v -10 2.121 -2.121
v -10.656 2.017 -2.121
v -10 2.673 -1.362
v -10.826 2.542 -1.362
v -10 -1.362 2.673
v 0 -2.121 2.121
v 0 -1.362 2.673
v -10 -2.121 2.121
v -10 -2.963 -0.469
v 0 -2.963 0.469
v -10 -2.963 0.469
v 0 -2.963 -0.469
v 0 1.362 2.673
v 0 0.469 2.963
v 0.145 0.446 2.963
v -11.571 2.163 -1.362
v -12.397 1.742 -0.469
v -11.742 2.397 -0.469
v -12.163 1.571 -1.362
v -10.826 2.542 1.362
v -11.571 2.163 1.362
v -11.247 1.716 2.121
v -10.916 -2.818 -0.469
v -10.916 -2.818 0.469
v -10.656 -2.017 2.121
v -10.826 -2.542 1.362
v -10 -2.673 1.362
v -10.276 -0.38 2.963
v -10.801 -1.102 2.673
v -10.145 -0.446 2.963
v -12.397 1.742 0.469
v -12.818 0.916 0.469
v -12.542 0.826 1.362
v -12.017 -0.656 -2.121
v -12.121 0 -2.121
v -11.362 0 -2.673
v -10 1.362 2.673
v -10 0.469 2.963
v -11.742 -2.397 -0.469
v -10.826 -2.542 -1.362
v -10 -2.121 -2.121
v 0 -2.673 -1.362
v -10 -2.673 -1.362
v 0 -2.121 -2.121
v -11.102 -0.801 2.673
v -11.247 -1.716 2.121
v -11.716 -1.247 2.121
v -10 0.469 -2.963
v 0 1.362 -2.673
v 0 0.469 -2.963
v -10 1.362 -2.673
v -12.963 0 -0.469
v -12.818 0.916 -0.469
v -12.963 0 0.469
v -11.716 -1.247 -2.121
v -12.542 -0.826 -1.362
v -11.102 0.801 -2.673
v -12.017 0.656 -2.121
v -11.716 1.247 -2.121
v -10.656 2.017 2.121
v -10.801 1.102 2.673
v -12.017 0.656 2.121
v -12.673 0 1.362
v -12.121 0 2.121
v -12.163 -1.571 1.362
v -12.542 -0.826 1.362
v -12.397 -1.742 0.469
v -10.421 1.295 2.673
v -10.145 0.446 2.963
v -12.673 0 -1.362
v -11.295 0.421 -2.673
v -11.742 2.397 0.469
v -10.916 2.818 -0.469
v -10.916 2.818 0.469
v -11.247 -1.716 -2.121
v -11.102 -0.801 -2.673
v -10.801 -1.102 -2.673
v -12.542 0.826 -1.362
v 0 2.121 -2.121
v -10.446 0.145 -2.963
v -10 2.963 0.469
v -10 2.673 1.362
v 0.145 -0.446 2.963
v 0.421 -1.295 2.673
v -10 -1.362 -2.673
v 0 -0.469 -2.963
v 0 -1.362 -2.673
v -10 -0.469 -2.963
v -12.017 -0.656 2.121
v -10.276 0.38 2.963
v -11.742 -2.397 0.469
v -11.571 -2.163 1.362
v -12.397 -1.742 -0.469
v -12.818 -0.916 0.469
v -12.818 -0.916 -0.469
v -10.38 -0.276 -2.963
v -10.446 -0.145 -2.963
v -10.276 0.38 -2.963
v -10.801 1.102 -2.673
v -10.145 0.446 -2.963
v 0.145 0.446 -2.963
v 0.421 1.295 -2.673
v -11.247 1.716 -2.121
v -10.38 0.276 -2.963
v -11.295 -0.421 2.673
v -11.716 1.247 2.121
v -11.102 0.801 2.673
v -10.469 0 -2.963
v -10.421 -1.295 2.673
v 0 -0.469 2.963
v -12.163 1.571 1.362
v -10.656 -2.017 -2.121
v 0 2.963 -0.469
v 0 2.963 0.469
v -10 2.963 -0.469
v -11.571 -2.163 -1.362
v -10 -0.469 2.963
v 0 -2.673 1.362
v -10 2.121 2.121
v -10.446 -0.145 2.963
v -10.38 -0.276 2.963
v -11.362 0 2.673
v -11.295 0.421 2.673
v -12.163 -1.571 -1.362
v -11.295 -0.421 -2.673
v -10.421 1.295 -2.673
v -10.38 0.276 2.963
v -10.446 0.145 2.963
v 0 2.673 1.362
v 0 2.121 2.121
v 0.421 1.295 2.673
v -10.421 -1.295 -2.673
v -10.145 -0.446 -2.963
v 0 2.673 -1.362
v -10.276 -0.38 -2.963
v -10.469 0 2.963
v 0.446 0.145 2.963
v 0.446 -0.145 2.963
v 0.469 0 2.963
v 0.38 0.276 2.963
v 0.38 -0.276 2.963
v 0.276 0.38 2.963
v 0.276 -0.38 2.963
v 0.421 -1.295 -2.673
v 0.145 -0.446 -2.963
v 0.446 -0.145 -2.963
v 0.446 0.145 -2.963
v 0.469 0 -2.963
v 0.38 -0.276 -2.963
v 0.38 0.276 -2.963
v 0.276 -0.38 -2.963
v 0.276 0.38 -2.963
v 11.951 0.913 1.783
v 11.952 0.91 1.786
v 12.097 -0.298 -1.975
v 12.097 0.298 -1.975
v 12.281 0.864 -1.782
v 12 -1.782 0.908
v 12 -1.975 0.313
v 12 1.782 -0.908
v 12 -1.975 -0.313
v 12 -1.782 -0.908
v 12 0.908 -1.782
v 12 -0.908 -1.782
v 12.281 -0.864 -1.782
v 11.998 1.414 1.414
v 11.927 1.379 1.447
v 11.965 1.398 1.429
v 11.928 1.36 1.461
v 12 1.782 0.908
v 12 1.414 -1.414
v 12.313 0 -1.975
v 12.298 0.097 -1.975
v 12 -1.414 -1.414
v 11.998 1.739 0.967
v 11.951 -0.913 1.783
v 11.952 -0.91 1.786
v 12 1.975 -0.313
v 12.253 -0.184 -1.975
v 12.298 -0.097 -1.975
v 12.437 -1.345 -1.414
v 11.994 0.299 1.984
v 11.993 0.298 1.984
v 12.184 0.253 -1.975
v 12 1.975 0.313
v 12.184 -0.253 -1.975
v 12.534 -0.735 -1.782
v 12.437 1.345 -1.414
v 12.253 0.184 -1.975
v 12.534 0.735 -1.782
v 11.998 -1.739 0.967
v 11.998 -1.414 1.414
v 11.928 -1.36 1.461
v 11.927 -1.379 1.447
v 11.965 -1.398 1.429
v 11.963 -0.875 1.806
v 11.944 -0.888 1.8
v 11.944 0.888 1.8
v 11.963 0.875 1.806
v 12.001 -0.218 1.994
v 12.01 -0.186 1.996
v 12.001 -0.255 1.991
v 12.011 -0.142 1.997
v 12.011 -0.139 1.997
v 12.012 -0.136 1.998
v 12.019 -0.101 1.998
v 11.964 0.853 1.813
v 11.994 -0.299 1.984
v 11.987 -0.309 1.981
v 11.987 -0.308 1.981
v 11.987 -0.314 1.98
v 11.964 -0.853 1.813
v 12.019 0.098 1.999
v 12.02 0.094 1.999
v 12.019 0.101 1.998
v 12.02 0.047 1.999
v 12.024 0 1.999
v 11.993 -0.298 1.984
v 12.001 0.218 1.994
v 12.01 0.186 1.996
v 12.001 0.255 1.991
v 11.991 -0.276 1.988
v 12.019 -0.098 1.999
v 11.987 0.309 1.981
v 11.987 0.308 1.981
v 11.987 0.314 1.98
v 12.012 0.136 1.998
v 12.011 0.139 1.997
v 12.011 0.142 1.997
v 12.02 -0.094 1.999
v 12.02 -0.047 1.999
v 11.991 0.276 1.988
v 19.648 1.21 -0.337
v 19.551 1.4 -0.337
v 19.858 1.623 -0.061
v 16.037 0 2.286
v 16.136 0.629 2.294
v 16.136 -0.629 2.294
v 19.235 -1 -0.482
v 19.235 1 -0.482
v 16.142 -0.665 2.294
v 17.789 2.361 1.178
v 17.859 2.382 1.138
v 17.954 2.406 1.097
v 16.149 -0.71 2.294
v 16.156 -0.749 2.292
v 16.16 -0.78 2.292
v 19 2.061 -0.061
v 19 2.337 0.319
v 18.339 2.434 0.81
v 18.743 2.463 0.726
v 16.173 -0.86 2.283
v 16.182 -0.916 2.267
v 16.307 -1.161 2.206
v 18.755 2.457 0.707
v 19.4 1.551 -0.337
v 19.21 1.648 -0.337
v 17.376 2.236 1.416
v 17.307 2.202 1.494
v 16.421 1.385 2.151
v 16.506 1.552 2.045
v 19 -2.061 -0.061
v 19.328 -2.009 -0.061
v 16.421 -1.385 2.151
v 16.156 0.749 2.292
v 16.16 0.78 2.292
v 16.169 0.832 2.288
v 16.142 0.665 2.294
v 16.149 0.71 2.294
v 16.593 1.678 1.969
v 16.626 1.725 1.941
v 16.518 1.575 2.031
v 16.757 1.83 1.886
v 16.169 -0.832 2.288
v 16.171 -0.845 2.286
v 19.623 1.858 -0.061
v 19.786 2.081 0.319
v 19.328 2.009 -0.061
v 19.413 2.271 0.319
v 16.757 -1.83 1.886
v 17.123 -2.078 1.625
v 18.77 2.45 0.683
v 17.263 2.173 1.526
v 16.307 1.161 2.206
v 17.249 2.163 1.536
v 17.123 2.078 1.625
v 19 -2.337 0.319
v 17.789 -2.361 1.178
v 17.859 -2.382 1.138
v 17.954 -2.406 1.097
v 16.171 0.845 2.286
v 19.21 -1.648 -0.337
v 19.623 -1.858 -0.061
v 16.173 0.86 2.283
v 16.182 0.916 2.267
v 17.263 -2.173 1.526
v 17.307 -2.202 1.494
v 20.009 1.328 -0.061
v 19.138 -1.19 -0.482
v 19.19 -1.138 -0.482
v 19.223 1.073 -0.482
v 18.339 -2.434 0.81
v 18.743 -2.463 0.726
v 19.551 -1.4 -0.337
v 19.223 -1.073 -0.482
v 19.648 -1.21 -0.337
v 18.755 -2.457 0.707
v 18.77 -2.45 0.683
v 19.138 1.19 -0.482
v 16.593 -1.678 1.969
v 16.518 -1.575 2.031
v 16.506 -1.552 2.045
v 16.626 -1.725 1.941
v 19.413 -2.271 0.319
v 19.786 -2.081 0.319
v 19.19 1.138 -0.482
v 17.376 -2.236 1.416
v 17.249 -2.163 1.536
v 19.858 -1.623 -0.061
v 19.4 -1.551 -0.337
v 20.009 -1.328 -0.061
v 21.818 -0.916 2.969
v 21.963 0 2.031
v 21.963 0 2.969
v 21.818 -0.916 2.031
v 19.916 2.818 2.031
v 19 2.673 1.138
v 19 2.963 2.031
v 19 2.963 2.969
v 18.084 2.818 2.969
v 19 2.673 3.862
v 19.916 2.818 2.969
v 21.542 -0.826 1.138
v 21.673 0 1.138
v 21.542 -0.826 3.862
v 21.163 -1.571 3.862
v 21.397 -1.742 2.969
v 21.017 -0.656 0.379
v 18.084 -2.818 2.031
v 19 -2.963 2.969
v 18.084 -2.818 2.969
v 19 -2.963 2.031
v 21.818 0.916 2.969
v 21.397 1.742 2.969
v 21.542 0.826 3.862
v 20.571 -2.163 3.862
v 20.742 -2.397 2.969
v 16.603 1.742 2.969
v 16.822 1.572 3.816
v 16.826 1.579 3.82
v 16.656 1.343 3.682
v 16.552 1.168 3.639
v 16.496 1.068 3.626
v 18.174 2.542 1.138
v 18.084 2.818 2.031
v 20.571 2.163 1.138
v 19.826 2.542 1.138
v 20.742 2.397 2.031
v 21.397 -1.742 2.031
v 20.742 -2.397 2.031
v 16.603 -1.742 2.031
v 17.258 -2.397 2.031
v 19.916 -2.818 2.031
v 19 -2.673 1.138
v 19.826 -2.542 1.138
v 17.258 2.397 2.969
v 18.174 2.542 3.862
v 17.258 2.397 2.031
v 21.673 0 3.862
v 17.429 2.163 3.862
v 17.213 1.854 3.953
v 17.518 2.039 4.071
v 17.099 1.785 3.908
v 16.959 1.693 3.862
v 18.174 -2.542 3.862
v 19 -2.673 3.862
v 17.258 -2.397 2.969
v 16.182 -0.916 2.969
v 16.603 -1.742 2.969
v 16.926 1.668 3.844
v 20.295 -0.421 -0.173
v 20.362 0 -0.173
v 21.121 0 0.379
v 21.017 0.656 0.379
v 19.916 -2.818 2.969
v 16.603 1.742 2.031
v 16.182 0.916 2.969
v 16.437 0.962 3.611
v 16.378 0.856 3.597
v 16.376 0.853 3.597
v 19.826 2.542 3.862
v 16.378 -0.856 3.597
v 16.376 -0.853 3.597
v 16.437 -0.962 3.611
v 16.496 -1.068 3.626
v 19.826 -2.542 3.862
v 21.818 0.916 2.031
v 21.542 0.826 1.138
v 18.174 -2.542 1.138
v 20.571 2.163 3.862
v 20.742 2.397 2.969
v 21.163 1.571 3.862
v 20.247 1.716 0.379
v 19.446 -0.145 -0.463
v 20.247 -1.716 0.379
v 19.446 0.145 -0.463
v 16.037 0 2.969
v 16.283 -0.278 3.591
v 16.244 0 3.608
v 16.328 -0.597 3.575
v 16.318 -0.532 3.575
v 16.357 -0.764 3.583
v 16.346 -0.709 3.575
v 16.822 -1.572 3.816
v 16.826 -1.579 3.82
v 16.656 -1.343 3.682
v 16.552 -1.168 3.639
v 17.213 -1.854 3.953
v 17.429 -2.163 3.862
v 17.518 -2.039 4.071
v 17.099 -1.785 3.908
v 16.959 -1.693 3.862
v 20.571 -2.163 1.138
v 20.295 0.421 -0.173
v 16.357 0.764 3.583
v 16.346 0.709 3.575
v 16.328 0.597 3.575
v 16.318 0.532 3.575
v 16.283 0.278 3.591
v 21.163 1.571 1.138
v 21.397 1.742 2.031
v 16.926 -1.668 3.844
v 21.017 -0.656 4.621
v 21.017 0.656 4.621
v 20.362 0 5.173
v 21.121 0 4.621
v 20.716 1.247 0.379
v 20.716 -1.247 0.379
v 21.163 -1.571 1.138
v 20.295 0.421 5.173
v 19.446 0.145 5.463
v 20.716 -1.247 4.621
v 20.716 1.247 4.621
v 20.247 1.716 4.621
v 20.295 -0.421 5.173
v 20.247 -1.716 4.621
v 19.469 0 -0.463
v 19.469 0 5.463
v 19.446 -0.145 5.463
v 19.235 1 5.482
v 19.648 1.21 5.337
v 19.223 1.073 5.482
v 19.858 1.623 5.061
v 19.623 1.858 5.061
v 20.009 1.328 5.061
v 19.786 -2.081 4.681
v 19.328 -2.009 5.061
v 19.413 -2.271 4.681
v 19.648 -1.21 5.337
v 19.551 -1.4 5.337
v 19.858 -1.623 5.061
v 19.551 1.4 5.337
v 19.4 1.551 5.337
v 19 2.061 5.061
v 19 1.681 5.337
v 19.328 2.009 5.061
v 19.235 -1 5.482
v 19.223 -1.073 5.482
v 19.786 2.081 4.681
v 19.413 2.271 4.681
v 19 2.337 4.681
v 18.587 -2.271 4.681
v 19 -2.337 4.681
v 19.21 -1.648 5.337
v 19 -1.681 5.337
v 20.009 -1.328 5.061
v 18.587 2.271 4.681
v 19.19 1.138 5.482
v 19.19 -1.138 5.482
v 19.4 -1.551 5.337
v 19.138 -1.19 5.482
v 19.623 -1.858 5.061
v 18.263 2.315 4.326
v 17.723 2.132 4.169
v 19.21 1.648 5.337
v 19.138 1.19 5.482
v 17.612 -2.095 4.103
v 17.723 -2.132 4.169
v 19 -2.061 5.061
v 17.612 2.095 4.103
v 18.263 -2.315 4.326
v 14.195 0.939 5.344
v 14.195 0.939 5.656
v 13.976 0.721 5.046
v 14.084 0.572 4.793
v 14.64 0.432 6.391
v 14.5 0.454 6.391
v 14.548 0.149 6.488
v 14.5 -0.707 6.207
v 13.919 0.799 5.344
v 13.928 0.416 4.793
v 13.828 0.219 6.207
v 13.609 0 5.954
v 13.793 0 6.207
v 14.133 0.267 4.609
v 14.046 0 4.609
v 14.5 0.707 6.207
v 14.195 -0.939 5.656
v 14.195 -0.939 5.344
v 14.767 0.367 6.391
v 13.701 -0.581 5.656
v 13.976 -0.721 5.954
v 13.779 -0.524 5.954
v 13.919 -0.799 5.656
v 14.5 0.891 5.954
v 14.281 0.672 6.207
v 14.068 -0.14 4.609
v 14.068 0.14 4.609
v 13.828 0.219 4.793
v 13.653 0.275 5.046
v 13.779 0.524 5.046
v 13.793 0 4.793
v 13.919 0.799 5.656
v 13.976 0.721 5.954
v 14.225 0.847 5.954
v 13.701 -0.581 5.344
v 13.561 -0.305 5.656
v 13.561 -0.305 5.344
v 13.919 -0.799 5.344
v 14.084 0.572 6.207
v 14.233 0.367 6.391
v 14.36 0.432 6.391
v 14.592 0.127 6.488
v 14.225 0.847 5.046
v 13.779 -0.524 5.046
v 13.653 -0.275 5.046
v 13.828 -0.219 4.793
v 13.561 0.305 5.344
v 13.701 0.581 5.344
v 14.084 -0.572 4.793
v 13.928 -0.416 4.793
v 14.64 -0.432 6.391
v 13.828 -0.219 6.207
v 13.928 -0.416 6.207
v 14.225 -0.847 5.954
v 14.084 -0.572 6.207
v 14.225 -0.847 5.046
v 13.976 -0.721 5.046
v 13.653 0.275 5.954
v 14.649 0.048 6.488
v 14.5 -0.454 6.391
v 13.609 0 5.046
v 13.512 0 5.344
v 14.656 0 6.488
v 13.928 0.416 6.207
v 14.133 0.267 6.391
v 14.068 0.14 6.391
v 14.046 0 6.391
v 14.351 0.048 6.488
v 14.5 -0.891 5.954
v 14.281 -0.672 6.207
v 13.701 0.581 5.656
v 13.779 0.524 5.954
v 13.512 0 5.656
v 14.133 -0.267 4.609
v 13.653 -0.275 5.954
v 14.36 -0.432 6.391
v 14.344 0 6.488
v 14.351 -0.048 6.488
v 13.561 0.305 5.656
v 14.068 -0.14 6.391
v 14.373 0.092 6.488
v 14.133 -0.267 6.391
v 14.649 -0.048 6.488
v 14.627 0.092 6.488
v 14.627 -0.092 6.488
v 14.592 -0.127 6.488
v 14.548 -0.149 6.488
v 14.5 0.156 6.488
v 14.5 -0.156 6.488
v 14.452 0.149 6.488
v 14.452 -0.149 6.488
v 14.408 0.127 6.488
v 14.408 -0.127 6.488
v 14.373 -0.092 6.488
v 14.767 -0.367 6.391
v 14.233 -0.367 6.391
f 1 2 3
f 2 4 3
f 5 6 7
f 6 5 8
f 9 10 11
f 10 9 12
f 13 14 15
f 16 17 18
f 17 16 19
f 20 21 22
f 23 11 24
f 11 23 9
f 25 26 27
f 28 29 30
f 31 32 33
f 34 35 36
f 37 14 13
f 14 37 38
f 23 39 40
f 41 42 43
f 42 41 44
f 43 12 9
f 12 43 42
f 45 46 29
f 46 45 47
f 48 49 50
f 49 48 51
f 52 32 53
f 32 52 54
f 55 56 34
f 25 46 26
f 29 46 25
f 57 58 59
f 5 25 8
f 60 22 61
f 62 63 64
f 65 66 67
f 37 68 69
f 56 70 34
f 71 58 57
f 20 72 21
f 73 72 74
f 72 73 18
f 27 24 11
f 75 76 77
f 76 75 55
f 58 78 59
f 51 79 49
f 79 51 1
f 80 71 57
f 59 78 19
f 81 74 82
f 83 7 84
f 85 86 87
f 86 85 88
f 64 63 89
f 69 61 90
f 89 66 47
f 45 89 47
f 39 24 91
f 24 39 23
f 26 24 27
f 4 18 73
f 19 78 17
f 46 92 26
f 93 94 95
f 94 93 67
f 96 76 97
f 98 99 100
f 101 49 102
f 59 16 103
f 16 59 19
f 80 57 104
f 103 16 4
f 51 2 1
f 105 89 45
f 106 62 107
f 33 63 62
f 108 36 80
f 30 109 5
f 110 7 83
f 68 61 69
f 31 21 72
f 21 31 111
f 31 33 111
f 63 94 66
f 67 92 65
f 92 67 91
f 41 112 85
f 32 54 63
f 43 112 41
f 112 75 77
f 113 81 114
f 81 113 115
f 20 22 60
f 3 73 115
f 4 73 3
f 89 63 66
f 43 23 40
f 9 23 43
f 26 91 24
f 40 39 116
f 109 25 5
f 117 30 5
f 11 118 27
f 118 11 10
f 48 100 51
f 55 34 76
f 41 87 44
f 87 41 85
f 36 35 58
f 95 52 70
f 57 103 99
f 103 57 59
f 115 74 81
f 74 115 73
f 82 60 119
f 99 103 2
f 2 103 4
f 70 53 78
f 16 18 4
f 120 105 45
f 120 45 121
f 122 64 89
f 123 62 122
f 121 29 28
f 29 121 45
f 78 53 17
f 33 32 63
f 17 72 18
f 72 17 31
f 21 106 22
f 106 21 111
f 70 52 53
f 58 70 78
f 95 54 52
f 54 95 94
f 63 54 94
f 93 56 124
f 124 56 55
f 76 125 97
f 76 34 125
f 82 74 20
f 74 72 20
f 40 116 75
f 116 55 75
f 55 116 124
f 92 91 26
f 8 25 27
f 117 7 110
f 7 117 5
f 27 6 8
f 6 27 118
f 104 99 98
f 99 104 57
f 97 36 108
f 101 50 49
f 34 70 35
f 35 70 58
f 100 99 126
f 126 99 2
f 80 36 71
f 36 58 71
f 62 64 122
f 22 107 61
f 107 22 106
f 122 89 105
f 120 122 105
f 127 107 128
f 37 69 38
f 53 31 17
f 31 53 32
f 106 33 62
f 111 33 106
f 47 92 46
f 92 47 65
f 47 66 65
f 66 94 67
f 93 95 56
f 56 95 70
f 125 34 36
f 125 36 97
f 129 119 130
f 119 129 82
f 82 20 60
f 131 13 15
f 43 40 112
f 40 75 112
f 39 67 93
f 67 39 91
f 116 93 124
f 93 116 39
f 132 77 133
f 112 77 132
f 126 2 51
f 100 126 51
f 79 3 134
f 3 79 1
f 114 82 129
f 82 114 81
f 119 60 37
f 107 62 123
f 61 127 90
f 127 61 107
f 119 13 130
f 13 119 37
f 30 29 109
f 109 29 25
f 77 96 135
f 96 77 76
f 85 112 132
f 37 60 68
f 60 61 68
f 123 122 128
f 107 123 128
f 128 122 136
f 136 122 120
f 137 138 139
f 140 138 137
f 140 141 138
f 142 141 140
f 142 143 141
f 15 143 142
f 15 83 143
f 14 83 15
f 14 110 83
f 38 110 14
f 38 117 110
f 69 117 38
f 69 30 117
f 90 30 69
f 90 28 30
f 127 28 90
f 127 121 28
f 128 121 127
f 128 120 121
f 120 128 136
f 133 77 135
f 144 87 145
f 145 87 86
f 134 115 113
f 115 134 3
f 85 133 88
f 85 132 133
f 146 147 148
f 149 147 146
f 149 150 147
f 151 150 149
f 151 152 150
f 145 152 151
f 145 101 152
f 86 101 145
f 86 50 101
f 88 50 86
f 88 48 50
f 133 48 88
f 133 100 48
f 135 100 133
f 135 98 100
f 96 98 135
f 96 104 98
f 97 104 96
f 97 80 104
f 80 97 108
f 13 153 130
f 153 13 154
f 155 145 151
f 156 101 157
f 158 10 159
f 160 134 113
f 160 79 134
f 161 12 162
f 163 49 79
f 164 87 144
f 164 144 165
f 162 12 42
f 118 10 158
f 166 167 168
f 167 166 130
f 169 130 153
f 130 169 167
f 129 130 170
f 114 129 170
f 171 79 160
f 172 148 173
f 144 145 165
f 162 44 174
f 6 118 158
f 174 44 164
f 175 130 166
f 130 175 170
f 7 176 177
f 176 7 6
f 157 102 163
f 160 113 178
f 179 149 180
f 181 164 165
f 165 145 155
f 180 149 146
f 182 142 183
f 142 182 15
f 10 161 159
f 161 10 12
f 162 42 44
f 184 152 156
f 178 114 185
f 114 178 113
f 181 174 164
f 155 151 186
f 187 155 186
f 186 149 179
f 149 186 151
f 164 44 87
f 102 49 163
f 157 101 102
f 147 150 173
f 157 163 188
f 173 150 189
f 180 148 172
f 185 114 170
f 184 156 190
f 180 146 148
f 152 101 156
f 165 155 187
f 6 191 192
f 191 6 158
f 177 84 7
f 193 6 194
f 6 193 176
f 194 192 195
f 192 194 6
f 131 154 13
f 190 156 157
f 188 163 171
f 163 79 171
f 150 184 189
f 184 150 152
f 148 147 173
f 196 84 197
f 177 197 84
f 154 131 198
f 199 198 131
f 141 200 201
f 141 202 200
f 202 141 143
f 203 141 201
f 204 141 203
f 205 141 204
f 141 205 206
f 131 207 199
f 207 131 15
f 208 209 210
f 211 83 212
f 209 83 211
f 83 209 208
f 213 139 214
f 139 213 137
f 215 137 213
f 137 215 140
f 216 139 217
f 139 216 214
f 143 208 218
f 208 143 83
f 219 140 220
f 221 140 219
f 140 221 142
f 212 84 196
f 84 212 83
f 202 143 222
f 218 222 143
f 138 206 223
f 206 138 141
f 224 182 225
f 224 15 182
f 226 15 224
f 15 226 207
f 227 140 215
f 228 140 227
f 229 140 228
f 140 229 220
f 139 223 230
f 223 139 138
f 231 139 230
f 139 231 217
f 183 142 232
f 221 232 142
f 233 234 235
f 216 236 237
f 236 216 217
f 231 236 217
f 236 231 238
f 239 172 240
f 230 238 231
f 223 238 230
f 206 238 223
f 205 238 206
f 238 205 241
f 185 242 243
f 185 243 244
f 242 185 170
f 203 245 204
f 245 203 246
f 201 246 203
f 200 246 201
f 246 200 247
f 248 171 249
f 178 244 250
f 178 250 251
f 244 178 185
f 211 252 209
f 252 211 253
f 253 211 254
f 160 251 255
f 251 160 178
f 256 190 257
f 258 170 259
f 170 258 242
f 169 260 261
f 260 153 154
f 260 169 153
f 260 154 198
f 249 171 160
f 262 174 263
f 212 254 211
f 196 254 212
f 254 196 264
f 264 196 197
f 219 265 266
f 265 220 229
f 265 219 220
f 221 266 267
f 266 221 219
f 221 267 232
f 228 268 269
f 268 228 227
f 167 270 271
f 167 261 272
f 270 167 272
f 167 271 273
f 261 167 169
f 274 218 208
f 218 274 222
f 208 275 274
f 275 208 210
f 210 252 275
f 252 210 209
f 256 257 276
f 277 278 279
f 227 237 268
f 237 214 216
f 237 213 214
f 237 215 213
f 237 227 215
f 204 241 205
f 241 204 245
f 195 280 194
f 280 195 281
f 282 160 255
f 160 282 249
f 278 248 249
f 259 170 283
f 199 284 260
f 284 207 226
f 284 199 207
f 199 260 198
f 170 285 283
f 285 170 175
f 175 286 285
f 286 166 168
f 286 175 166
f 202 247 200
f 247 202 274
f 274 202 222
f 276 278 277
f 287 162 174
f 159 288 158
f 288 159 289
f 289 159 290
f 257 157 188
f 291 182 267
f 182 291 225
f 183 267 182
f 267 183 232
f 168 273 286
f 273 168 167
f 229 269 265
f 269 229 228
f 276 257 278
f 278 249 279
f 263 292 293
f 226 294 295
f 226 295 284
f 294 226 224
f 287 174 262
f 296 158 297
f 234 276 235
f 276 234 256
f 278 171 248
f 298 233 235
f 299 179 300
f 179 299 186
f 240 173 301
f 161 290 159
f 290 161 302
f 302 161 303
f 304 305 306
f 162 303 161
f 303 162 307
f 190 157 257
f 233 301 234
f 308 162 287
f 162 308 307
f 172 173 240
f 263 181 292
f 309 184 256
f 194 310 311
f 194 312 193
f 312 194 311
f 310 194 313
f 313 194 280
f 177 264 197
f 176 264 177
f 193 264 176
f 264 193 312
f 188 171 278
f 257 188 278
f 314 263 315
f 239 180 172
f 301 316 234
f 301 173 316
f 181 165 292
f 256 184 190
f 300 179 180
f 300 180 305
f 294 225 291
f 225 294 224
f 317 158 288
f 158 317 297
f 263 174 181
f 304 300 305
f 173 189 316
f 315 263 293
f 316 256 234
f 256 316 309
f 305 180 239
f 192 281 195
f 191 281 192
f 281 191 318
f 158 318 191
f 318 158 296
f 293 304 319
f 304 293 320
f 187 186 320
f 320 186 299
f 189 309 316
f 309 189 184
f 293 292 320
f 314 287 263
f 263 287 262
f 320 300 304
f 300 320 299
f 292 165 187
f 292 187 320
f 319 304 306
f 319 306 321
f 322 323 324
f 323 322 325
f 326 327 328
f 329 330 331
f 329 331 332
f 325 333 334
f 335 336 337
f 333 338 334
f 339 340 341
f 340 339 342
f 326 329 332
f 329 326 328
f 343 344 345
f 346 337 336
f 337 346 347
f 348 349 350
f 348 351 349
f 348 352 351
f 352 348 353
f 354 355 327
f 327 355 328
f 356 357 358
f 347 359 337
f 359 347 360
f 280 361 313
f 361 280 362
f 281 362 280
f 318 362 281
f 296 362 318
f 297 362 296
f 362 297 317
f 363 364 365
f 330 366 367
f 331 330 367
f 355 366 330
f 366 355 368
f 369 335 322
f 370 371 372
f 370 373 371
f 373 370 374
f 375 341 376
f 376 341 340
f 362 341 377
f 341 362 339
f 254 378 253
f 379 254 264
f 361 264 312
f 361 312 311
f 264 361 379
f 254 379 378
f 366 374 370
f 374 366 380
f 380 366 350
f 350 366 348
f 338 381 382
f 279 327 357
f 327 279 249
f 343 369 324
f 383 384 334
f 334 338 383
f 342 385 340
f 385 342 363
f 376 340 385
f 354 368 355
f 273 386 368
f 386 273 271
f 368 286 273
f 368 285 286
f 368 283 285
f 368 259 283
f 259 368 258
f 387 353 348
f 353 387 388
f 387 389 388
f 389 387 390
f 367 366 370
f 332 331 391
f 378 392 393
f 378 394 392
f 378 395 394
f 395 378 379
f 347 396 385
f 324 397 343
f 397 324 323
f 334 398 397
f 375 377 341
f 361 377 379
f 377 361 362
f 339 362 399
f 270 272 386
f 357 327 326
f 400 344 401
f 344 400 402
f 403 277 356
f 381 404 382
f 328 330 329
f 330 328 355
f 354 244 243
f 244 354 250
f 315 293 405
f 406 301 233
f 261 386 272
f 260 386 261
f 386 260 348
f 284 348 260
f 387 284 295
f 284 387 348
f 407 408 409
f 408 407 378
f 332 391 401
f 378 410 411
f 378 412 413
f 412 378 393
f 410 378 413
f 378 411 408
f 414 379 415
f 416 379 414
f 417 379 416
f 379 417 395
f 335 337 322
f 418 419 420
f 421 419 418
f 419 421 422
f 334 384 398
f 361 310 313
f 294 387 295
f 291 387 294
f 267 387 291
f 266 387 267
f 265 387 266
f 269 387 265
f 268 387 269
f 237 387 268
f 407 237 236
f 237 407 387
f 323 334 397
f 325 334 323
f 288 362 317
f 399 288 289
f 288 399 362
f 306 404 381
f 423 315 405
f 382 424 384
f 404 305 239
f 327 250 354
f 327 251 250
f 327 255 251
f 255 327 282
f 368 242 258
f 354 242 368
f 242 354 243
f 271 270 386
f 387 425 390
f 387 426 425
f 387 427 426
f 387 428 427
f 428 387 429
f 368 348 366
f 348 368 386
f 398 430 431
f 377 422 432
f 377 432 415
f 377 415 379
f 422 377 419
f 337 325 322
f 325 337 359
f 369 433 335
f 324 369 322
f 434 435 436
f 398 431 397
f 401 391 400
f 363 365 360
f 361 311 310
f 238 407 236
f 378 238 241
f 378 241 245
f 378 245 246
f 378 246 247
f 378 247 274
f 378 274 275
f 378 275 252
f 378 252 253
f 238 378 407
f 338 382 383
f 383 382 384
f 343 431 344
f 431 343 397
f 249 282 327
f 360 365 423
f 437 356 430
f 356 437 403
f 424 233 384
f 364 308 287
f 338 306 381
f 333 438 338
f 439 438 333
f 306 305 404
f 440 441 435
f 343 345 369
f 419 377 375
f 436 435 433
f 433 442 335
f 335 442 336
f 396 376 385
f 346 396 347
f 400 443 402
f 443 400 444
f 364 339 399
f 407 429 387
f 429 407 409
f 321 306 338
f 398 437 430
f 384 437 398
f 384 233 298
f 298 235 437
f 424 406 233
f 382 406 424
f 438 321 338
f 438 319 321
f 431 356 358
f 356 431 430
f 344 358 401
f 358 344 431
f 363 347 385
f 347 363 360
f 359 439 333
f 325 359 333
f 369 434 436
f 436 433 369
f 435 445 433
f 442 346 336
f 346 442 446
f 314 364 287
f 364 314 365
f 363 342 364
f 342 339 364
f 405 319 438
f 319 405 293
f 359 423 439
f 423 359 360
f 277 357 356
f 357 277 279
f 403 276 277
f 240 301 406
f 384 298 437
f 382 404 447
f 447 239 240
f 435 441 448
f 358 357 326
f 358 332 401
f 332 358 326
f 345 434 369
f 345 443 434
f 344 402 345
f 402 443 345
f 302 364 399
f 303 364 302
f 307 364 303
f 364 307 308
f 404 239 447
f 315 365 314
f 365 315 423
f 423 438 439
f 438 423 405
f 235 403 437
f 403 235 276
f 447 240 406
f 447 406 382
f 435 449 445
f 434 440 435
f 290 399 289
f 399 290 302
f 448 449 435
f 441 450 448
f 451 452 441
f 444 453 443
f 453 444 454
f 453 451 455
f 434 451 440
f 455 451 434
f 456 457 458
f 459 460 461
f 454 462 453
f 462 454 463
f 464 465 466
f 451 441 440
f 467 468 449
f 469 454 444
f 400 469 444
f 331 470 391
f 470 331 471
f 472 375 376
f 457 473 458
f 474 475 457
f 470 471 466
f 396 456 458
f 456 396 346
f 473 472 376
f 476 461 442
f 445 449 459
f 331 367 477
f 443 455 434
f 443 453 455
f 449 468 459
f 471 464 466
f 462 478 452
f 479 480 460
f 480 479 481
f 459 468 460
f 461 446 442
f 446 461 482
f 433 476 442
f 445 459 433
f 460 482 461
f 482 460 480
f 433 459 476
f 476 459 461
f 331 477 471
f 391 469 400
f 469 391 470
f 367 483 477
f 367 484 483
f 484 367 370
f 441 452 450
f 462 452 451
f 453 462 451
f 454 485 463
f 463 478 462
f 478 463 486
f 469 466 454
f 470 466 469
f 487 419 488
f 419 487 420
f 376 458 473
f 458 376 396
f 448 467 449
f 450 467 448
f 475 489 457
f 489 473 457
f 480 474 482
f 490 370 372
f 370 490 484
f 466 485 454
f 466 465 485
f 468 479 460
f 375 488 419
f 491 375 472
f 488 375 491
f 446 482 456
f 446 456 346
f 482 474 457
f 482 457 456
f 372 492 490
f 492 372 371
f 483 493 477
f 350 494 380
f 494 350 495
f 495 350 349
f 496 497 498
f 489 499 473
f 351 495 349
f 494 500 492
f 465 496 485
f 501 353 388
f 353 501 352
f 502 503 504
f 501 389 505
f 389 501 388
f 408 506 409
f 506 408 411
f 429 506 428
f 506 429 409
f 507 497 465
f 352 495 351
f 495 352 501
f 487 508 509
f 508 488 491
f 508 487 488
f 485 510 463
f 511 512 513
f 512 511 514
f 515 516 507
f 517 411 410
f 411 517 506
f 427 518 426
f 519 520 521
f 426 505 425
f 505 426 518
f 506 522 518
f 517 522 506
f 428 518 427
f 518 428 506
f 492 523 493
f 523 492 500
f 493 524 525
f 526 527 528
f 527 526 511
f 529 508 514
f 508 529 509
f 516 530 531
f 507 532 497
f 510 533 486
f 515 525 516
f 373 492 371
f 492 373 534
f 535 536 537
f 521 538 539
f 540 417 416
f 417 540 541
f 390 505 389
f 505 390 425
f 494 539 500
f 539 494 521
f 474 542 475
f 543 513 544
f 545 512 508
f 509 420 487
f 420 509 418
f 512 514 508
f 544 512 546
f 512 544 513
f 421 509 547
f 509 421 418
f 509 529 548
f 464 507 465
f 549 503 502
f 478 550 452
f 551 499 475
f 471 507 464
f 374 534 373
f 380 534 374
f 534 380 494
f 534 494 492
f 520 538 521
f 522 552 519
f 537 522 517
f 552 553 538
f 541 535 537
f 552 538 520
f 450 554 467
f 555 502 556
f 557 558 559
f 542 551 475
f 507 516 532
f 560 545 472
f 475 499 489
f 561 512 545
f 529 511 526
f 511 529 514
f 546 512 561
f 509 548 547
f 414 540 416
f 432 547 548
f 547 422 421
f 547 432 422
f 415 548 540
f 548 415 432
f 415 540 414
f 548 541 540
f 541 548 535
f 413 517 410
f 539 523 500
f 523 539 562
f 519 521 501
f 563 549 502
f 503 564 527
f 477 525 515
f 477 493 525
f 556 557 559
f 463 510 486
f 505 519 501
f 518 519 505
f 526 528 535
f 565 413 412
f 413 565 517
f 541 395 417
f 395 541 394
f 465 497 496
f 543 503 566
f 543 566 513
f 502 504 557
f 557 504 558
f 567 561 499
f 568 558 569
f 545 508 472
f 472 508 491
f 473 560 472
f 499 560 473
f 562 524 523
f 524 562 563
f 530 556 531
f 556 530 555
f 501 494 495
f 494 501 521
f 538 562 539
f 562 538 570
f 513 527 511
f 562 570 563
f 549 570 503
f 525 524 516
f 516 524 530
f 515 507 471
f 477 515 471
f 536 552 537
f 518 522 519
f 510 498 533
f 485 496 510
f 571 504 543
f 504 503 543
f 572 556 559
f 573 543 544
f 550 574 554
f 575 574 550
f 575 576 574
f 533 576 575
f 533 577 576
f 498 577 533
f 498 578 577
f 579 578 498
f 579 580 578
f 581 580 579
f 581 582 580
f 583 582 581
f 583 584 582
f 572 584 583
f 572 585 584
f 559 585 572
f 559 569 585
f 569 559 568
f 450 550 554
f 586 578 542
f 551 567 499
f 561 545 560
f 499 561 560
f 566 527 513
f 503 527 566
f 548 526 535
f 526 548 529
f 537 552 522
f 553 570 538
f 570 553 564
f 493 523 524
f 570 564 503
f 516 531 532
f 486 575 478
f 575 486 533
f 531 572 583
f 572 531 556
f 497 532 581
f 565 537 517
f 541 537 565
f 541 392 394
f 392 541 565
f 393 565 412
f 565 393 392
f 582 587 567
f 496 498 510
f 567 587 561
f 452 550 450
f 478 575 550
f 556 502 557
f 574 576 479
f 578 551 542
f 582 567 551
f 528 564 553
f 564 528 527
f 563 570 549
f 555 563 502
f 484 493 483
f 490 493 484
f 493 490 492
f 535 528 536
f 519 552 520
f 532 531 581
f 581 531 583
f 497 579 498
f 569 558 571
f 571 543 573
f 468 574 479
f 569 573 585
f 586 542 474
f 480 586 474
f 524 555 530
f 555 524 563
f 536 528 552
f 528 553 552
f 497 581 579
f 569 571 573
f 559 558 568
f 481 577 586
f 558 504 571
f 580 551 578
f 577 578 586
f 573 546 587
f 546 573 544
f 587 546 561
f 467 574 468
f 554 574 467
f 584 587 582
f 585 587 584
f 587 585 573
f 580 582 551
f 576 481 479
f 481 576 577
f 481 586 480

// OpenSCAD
$fn = 20;

handle_l = 10;
handle_r = 3;

neck_r = 2;
neck_l = 12;

tip_r = 3;
tip_l = 7;
tip_h = 2.5;

hook_r = 1;
hook_l = 4.5;
hook_h = 3;

module base(){translate([-handle_l, 0, 0]) sphere(handle_r);}
module shoulder(){sphere(handle_r);}
module neck(){translate([neck_l, 0, 0]) sphere(neck_r);}
module jaw(w=1/3){
    translate([neck_l + tip_l, tip_r*w, tip_h - tip_r/2])
    sphere(tip_r/2);
    translate([neck_l + tip_l, -tip_r*w, tip_h - tip_r/2])
    sphere(tip_r/2);
}
module tip(){translate([neck_l + tip_l, 0, tip_h]) sphere(tip_r);}
module post_tip(w=1/3){
    translate([neck_l + tip_l, tip_r*w, tip_h + tip_r/2])
    sphere(tip_r/2);
    translate([neck_l + tip_l, -tip_r*w, tip_h + tip_r/2])
    sphere(tip_r/2);
}
module hook(){
    translate([neck_l + tip_l - hook_l, 0, tip_h + hook_h])
    sphere(hook_r);
}

module all(){
    hull(){base(); shoulder();}
    hull(){shoulder(); neck();}
    hull(){neck(); jaw();}
    hull(){jaw(); tip();}
    hull(){tip(); post_tip();}
    hull(){post_tip(); hook();}
}

all();
